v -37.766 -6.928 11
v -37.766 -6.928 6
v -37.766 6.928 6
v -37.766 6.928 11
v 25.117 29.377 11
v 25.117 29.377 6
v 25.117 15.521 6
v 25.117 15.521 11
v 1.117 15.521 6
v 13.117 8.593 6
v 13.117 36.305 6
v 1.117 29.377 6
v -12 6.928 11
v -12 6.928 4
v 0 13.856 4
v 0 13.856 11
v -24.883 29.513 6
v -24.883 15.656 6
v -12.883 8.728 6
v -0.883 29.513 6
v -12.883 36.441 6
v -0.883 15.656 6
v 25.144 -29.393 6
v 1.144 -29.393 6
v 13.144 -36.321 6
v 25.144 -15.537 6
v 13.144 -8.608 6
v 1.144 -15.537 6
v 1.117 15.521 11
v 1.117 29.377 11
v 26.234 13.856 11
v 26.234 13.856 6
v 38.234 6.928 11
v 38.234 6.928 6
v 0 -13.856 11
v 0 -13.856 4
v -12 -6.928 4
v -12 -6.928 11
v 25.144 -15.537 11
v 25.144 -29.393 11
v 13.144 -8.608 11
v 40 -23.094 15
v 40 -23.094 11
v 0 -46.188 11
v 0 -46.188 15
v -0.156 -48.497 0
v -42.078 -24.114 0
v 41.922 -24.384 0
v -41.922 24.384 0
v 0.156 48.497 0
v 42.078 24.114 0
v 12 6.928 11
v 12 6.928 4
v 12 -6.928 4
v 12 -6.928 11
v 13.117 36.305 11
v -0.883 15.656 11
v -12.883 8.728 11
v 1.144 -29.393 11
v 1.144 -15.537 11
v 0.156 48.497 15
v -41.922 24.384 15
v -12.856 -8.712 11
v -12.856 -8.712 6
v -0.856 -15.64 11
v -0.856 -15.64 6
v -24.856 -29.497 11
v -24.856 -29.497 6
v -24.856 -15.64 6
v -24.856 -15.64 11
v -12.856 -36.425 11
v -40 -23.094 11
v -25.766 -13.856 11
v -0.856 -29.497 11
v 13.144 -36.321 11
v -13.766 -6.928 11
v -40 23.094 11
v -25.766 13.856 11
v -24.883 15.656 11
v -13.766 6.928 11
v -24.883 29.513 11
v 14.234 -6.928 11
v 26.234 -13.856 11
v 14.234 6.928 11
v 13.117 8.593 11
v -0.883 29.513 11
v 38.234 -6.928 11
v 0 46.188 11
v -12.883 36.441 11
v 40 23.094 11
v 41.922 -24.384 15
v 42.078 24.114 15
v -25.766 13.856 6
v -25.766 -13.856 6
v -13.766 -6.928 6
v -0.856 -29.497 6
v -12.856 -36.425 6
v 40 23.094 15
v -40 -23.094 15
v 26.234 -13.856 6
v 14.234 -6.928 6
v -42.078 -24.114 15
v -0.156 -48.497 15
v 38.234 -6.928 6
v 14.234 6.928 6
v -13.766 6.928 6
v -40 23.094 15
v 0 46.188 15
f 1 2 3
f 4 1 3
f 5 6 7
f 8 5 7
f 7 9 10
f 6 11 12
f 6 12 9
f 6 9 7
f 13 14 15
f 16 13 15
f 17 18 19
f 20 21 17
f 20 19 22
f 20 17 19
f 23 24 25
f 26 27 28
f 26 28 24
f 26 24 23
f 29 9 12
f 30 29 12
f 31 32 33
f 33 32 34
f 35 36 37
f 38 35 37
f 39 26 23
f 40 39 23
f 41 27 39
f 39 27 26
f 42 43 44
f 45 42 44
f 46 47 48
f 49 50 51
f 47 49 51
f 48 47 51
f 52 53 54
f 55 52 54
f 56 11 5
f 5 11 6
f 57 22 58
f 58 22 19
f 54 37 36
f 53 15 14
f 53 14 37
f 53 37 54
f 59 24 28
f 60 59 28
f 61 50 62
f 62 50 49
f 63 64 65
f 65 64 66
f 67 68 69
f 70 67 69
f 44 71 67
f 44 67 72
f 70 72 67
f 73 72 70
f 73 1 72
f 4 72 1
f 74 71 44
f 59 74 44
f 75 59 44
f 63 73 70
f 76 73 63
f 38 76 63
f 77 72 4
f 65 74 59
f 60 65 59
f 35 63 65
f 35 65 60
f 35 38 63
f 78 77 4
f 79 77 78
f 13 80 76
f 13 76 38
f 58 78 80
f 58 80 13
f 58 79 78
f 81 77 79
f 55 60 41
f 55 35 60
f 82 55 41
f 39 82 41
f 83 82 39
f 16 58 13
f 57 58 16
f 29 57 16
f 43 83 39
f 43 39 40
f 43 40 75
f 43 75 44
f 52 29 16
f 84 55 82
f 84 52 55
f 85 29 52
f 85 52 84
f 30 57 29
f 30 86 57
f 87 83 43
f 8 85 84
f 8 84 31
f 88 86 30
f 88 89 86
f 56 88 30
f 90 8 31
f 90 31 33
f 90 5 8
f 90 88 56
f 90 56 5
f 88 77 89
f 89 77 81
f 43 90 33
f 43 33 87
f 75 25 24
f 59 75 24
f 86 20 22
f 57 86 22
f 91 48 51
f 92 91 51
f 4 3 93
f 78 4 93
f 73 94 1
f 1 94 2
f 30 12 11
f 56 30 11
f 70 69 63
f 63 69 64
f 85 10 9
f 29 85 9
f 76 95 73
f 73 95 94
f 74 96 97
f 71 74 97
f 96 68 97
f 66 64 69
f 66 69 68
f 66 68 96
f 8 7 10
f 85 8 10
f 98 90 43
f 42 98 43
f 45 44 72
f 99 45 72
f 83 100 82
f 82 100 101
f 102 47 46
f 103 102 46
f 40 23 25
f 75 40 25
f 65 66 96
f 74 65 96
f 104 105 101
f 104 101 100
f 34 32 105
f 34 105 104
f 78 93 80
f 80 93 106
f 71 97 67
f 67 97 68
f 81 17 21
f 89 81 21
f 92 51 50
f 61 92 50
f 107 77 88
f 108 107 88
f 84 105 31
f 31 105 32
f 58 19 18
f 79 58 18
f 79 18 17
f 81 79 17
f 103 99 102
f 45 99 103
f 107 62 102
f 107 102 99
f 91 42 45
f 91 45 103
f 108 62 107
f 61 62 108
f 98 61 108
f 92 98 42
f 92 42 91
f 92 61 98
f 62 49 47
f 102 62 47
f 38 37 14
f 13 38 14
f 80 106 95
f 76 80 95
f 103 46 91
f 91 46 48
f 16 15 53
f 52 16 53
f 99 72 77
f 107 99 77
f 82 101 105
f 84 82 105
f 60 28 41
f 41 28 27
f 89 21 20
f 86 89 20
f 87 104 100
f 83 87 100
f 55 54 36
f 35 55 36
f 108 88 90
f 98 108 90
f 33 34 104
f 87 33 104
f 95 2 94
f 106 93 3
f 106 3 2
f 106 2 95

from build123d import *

# Parameters (mm, degrees)
F1_DEPTH = 15
F2_DEPTH = 11
F3_DEPTH = 4
F4_DEPTH = 2


with BuildPart() as f1:
    # F0 (on Top) → F1 (new body)
    with BuildSketch(Plane.XY):
        Polygon((42.0776976909, 24.1136342559), (0.1558290023, 48.4971722611), (-41.9218686887, 24.3835380051), (-42.0776976909, -24.1136342559), (-0.1558290023, -48.4971722611), (41.9218686887, -24.3835380051), align=None)
        Polygon((-40, 23.0940107676), (0, 46.1880215352), (40, 23.0940107676), (40, -23.0940107676), (0, -46.1880215352), (-40, -23.0940107676), align=None, mode=Mode.SUBTRACT)
    extrude(amount=F1_DEPTH)

    # F0 (on Top) → F2 (join)
    with BuildSketch(Plane.XY):
        Polygon((40, 23.0940107676), (0, 46.1880215352), (-40, 23.0940107676), (-40, -23.0940107676), (0, -46.1880215352), (40, -23.0940107676), align=None)
        Polygon((-12.8555934585, -8.7122082831), (-0.8555934585, -15.6404115134), (-0.8555934585, -29.4968179739), (-12.8555934585, -36.4250212042), (-24.8555934585, -29.4968179739), (-24.8555934585, -15.6404115134), align=None, mode=Mode.SUBTRACT)
        Polygon((13.1444065415, -8.6082997926), (25.1444065415, -15.5365030229), (25.1444065415, -29.3929094834), (13.1444065415, -36.3211127137), (1.1444065415, -29.3929094834), (1.1444065415, -15.5365030229), align=None, mode=Mode.SUBTRACT)
        Polygon((-25.7656060661, 13.8564064606), (-13.7656060661, 6.9282032303), (-13.7656060661, -6.9282032303), (-25.7656060661, -13.8564064606), (-37.7656060661, -6.9282032303), (-37.7656060661, 6.9282032303), align=None, mode=Mode.SUBTRACT)
        Polygon((-12.882803033, 36.4407306594), (-0.882803033, 29.5125274291), (-0.882803033, 15.6561209685), (-12.882803033, 8.7279177383), (-24.882803033, 15.6561209685), (-24.882803033, 29.5125274291), align=None, mode=Mode.SUBTRACT)
        Polygon((0, 13.8564064606), (12, 6.9282032303), (12, -6.9282032303), (0, -13.8564064606), (-12, -6.9282032303), (-12, 6.9282032303), align=None, mode=Mode.SUBTRACT)
        Polygon((13.117196967, 36.3054032585), (25.117196967, 29.3772000282), (25.117196967, 15.5207935677), (13.117196967, 8.5925903374), (1.117196967, 15.5207935677), (1.117196967, 29.3772000282), align=None, mode=Mode.SUBTRACT)
        Polygon((26.2343939339, 13.8564064606), (38.2343939339, 6.9282032303), (38.2343939339, -6.9282032303), (26.2343939339, -13.8564064606), (14.2343939339, -6.9282032303), (14.2343939339, 6.9282032303), align=None, mode=Mode.SUBTRACT)
    extrude(amount=F2_DEPTH)

    # F0 (on Top) → F3 (join)
    with BuildSketch(Plane.XY):
        Polygon((25.117196967, 15.5207935677), (25.117196967, 29.3772000282), (13.117196967, 36.3054032585), (1.117196967, 29.3772000282), (1.117196967, 15.5207935677), (13.117196967, 8.5925903374), align=None)
        Polygon((-0.882803033, 15.6561209685), (-0.882803033, 29.5125274291), (-12.882803033, 36.4407306594), (-24.882803033, 29.5125274291), (-24.882803033, 15.6561209685), (-12.882803033, 8.7279177383), align=None)
        Polygon((-13.7656060661, -6.9282032303), (-13.7656060661, 6.9282032303), (-25.7656060661, 13.8564064606), (-37.7656060661, 6.9282032303), (-37.7656060661, -6.9282032303), (-25.7656060661, -13.8564064606), align=None)
        Polygon((12, -6.9282032303), (12, 6.9282032303), (0, 13.8564064606), (-12, 6.9282032303), (-12, -6.9282032303), (0, -13.8564064606), align=None)
        Polygon((38.2343939339, -6.9282032303), (38.2343939339, 6.9282032303), (26.2343939339, 13.8564064606), (14.2343939339, 6.9282032303), (14.2343939339, -6.9282032303), (26.2343939339, -13.8564064606), align=None)
        Polygon((25.1444065415, -29.3929094834), (25.1444065415, -15.5365030229), (13.1444065415, -8.6082997926), (1.1444065415, -15.5365030229), (1.1444065415, -29.3929094834), (13.1444065415, -36.3211127137), align=None)
        Polygon((-0.8555934585, -29.4968179739), (-0.8555934585, -15.6404115134), (-12.8555934585, -8.7122082831), (-24.8555934585, -15.6404115134), (-24.8555934585, -29.4968179739), (-12.8555934585, -36.4250212042), align=None)
    extrude(amount=F3_DEPTH)

    # F4 (add): faces of the model
    f4_faces = [f1.faces().sort_by_distance(p)[0] for p in [
        (-25.7656060661, 0, 4),
        (-12.882803033, 22.5843241988, 4),
        (13.117196967, 22.448996798, 4),
        (26.2343939339, 0, 4),
        (13.1444065415, -22.4647062531, 4),
        (-12.8555934585, -22.5686147437, 4),
    ]]
    extrude(f4_faces, amount=F4_DEPTH)


solid = f1.part
